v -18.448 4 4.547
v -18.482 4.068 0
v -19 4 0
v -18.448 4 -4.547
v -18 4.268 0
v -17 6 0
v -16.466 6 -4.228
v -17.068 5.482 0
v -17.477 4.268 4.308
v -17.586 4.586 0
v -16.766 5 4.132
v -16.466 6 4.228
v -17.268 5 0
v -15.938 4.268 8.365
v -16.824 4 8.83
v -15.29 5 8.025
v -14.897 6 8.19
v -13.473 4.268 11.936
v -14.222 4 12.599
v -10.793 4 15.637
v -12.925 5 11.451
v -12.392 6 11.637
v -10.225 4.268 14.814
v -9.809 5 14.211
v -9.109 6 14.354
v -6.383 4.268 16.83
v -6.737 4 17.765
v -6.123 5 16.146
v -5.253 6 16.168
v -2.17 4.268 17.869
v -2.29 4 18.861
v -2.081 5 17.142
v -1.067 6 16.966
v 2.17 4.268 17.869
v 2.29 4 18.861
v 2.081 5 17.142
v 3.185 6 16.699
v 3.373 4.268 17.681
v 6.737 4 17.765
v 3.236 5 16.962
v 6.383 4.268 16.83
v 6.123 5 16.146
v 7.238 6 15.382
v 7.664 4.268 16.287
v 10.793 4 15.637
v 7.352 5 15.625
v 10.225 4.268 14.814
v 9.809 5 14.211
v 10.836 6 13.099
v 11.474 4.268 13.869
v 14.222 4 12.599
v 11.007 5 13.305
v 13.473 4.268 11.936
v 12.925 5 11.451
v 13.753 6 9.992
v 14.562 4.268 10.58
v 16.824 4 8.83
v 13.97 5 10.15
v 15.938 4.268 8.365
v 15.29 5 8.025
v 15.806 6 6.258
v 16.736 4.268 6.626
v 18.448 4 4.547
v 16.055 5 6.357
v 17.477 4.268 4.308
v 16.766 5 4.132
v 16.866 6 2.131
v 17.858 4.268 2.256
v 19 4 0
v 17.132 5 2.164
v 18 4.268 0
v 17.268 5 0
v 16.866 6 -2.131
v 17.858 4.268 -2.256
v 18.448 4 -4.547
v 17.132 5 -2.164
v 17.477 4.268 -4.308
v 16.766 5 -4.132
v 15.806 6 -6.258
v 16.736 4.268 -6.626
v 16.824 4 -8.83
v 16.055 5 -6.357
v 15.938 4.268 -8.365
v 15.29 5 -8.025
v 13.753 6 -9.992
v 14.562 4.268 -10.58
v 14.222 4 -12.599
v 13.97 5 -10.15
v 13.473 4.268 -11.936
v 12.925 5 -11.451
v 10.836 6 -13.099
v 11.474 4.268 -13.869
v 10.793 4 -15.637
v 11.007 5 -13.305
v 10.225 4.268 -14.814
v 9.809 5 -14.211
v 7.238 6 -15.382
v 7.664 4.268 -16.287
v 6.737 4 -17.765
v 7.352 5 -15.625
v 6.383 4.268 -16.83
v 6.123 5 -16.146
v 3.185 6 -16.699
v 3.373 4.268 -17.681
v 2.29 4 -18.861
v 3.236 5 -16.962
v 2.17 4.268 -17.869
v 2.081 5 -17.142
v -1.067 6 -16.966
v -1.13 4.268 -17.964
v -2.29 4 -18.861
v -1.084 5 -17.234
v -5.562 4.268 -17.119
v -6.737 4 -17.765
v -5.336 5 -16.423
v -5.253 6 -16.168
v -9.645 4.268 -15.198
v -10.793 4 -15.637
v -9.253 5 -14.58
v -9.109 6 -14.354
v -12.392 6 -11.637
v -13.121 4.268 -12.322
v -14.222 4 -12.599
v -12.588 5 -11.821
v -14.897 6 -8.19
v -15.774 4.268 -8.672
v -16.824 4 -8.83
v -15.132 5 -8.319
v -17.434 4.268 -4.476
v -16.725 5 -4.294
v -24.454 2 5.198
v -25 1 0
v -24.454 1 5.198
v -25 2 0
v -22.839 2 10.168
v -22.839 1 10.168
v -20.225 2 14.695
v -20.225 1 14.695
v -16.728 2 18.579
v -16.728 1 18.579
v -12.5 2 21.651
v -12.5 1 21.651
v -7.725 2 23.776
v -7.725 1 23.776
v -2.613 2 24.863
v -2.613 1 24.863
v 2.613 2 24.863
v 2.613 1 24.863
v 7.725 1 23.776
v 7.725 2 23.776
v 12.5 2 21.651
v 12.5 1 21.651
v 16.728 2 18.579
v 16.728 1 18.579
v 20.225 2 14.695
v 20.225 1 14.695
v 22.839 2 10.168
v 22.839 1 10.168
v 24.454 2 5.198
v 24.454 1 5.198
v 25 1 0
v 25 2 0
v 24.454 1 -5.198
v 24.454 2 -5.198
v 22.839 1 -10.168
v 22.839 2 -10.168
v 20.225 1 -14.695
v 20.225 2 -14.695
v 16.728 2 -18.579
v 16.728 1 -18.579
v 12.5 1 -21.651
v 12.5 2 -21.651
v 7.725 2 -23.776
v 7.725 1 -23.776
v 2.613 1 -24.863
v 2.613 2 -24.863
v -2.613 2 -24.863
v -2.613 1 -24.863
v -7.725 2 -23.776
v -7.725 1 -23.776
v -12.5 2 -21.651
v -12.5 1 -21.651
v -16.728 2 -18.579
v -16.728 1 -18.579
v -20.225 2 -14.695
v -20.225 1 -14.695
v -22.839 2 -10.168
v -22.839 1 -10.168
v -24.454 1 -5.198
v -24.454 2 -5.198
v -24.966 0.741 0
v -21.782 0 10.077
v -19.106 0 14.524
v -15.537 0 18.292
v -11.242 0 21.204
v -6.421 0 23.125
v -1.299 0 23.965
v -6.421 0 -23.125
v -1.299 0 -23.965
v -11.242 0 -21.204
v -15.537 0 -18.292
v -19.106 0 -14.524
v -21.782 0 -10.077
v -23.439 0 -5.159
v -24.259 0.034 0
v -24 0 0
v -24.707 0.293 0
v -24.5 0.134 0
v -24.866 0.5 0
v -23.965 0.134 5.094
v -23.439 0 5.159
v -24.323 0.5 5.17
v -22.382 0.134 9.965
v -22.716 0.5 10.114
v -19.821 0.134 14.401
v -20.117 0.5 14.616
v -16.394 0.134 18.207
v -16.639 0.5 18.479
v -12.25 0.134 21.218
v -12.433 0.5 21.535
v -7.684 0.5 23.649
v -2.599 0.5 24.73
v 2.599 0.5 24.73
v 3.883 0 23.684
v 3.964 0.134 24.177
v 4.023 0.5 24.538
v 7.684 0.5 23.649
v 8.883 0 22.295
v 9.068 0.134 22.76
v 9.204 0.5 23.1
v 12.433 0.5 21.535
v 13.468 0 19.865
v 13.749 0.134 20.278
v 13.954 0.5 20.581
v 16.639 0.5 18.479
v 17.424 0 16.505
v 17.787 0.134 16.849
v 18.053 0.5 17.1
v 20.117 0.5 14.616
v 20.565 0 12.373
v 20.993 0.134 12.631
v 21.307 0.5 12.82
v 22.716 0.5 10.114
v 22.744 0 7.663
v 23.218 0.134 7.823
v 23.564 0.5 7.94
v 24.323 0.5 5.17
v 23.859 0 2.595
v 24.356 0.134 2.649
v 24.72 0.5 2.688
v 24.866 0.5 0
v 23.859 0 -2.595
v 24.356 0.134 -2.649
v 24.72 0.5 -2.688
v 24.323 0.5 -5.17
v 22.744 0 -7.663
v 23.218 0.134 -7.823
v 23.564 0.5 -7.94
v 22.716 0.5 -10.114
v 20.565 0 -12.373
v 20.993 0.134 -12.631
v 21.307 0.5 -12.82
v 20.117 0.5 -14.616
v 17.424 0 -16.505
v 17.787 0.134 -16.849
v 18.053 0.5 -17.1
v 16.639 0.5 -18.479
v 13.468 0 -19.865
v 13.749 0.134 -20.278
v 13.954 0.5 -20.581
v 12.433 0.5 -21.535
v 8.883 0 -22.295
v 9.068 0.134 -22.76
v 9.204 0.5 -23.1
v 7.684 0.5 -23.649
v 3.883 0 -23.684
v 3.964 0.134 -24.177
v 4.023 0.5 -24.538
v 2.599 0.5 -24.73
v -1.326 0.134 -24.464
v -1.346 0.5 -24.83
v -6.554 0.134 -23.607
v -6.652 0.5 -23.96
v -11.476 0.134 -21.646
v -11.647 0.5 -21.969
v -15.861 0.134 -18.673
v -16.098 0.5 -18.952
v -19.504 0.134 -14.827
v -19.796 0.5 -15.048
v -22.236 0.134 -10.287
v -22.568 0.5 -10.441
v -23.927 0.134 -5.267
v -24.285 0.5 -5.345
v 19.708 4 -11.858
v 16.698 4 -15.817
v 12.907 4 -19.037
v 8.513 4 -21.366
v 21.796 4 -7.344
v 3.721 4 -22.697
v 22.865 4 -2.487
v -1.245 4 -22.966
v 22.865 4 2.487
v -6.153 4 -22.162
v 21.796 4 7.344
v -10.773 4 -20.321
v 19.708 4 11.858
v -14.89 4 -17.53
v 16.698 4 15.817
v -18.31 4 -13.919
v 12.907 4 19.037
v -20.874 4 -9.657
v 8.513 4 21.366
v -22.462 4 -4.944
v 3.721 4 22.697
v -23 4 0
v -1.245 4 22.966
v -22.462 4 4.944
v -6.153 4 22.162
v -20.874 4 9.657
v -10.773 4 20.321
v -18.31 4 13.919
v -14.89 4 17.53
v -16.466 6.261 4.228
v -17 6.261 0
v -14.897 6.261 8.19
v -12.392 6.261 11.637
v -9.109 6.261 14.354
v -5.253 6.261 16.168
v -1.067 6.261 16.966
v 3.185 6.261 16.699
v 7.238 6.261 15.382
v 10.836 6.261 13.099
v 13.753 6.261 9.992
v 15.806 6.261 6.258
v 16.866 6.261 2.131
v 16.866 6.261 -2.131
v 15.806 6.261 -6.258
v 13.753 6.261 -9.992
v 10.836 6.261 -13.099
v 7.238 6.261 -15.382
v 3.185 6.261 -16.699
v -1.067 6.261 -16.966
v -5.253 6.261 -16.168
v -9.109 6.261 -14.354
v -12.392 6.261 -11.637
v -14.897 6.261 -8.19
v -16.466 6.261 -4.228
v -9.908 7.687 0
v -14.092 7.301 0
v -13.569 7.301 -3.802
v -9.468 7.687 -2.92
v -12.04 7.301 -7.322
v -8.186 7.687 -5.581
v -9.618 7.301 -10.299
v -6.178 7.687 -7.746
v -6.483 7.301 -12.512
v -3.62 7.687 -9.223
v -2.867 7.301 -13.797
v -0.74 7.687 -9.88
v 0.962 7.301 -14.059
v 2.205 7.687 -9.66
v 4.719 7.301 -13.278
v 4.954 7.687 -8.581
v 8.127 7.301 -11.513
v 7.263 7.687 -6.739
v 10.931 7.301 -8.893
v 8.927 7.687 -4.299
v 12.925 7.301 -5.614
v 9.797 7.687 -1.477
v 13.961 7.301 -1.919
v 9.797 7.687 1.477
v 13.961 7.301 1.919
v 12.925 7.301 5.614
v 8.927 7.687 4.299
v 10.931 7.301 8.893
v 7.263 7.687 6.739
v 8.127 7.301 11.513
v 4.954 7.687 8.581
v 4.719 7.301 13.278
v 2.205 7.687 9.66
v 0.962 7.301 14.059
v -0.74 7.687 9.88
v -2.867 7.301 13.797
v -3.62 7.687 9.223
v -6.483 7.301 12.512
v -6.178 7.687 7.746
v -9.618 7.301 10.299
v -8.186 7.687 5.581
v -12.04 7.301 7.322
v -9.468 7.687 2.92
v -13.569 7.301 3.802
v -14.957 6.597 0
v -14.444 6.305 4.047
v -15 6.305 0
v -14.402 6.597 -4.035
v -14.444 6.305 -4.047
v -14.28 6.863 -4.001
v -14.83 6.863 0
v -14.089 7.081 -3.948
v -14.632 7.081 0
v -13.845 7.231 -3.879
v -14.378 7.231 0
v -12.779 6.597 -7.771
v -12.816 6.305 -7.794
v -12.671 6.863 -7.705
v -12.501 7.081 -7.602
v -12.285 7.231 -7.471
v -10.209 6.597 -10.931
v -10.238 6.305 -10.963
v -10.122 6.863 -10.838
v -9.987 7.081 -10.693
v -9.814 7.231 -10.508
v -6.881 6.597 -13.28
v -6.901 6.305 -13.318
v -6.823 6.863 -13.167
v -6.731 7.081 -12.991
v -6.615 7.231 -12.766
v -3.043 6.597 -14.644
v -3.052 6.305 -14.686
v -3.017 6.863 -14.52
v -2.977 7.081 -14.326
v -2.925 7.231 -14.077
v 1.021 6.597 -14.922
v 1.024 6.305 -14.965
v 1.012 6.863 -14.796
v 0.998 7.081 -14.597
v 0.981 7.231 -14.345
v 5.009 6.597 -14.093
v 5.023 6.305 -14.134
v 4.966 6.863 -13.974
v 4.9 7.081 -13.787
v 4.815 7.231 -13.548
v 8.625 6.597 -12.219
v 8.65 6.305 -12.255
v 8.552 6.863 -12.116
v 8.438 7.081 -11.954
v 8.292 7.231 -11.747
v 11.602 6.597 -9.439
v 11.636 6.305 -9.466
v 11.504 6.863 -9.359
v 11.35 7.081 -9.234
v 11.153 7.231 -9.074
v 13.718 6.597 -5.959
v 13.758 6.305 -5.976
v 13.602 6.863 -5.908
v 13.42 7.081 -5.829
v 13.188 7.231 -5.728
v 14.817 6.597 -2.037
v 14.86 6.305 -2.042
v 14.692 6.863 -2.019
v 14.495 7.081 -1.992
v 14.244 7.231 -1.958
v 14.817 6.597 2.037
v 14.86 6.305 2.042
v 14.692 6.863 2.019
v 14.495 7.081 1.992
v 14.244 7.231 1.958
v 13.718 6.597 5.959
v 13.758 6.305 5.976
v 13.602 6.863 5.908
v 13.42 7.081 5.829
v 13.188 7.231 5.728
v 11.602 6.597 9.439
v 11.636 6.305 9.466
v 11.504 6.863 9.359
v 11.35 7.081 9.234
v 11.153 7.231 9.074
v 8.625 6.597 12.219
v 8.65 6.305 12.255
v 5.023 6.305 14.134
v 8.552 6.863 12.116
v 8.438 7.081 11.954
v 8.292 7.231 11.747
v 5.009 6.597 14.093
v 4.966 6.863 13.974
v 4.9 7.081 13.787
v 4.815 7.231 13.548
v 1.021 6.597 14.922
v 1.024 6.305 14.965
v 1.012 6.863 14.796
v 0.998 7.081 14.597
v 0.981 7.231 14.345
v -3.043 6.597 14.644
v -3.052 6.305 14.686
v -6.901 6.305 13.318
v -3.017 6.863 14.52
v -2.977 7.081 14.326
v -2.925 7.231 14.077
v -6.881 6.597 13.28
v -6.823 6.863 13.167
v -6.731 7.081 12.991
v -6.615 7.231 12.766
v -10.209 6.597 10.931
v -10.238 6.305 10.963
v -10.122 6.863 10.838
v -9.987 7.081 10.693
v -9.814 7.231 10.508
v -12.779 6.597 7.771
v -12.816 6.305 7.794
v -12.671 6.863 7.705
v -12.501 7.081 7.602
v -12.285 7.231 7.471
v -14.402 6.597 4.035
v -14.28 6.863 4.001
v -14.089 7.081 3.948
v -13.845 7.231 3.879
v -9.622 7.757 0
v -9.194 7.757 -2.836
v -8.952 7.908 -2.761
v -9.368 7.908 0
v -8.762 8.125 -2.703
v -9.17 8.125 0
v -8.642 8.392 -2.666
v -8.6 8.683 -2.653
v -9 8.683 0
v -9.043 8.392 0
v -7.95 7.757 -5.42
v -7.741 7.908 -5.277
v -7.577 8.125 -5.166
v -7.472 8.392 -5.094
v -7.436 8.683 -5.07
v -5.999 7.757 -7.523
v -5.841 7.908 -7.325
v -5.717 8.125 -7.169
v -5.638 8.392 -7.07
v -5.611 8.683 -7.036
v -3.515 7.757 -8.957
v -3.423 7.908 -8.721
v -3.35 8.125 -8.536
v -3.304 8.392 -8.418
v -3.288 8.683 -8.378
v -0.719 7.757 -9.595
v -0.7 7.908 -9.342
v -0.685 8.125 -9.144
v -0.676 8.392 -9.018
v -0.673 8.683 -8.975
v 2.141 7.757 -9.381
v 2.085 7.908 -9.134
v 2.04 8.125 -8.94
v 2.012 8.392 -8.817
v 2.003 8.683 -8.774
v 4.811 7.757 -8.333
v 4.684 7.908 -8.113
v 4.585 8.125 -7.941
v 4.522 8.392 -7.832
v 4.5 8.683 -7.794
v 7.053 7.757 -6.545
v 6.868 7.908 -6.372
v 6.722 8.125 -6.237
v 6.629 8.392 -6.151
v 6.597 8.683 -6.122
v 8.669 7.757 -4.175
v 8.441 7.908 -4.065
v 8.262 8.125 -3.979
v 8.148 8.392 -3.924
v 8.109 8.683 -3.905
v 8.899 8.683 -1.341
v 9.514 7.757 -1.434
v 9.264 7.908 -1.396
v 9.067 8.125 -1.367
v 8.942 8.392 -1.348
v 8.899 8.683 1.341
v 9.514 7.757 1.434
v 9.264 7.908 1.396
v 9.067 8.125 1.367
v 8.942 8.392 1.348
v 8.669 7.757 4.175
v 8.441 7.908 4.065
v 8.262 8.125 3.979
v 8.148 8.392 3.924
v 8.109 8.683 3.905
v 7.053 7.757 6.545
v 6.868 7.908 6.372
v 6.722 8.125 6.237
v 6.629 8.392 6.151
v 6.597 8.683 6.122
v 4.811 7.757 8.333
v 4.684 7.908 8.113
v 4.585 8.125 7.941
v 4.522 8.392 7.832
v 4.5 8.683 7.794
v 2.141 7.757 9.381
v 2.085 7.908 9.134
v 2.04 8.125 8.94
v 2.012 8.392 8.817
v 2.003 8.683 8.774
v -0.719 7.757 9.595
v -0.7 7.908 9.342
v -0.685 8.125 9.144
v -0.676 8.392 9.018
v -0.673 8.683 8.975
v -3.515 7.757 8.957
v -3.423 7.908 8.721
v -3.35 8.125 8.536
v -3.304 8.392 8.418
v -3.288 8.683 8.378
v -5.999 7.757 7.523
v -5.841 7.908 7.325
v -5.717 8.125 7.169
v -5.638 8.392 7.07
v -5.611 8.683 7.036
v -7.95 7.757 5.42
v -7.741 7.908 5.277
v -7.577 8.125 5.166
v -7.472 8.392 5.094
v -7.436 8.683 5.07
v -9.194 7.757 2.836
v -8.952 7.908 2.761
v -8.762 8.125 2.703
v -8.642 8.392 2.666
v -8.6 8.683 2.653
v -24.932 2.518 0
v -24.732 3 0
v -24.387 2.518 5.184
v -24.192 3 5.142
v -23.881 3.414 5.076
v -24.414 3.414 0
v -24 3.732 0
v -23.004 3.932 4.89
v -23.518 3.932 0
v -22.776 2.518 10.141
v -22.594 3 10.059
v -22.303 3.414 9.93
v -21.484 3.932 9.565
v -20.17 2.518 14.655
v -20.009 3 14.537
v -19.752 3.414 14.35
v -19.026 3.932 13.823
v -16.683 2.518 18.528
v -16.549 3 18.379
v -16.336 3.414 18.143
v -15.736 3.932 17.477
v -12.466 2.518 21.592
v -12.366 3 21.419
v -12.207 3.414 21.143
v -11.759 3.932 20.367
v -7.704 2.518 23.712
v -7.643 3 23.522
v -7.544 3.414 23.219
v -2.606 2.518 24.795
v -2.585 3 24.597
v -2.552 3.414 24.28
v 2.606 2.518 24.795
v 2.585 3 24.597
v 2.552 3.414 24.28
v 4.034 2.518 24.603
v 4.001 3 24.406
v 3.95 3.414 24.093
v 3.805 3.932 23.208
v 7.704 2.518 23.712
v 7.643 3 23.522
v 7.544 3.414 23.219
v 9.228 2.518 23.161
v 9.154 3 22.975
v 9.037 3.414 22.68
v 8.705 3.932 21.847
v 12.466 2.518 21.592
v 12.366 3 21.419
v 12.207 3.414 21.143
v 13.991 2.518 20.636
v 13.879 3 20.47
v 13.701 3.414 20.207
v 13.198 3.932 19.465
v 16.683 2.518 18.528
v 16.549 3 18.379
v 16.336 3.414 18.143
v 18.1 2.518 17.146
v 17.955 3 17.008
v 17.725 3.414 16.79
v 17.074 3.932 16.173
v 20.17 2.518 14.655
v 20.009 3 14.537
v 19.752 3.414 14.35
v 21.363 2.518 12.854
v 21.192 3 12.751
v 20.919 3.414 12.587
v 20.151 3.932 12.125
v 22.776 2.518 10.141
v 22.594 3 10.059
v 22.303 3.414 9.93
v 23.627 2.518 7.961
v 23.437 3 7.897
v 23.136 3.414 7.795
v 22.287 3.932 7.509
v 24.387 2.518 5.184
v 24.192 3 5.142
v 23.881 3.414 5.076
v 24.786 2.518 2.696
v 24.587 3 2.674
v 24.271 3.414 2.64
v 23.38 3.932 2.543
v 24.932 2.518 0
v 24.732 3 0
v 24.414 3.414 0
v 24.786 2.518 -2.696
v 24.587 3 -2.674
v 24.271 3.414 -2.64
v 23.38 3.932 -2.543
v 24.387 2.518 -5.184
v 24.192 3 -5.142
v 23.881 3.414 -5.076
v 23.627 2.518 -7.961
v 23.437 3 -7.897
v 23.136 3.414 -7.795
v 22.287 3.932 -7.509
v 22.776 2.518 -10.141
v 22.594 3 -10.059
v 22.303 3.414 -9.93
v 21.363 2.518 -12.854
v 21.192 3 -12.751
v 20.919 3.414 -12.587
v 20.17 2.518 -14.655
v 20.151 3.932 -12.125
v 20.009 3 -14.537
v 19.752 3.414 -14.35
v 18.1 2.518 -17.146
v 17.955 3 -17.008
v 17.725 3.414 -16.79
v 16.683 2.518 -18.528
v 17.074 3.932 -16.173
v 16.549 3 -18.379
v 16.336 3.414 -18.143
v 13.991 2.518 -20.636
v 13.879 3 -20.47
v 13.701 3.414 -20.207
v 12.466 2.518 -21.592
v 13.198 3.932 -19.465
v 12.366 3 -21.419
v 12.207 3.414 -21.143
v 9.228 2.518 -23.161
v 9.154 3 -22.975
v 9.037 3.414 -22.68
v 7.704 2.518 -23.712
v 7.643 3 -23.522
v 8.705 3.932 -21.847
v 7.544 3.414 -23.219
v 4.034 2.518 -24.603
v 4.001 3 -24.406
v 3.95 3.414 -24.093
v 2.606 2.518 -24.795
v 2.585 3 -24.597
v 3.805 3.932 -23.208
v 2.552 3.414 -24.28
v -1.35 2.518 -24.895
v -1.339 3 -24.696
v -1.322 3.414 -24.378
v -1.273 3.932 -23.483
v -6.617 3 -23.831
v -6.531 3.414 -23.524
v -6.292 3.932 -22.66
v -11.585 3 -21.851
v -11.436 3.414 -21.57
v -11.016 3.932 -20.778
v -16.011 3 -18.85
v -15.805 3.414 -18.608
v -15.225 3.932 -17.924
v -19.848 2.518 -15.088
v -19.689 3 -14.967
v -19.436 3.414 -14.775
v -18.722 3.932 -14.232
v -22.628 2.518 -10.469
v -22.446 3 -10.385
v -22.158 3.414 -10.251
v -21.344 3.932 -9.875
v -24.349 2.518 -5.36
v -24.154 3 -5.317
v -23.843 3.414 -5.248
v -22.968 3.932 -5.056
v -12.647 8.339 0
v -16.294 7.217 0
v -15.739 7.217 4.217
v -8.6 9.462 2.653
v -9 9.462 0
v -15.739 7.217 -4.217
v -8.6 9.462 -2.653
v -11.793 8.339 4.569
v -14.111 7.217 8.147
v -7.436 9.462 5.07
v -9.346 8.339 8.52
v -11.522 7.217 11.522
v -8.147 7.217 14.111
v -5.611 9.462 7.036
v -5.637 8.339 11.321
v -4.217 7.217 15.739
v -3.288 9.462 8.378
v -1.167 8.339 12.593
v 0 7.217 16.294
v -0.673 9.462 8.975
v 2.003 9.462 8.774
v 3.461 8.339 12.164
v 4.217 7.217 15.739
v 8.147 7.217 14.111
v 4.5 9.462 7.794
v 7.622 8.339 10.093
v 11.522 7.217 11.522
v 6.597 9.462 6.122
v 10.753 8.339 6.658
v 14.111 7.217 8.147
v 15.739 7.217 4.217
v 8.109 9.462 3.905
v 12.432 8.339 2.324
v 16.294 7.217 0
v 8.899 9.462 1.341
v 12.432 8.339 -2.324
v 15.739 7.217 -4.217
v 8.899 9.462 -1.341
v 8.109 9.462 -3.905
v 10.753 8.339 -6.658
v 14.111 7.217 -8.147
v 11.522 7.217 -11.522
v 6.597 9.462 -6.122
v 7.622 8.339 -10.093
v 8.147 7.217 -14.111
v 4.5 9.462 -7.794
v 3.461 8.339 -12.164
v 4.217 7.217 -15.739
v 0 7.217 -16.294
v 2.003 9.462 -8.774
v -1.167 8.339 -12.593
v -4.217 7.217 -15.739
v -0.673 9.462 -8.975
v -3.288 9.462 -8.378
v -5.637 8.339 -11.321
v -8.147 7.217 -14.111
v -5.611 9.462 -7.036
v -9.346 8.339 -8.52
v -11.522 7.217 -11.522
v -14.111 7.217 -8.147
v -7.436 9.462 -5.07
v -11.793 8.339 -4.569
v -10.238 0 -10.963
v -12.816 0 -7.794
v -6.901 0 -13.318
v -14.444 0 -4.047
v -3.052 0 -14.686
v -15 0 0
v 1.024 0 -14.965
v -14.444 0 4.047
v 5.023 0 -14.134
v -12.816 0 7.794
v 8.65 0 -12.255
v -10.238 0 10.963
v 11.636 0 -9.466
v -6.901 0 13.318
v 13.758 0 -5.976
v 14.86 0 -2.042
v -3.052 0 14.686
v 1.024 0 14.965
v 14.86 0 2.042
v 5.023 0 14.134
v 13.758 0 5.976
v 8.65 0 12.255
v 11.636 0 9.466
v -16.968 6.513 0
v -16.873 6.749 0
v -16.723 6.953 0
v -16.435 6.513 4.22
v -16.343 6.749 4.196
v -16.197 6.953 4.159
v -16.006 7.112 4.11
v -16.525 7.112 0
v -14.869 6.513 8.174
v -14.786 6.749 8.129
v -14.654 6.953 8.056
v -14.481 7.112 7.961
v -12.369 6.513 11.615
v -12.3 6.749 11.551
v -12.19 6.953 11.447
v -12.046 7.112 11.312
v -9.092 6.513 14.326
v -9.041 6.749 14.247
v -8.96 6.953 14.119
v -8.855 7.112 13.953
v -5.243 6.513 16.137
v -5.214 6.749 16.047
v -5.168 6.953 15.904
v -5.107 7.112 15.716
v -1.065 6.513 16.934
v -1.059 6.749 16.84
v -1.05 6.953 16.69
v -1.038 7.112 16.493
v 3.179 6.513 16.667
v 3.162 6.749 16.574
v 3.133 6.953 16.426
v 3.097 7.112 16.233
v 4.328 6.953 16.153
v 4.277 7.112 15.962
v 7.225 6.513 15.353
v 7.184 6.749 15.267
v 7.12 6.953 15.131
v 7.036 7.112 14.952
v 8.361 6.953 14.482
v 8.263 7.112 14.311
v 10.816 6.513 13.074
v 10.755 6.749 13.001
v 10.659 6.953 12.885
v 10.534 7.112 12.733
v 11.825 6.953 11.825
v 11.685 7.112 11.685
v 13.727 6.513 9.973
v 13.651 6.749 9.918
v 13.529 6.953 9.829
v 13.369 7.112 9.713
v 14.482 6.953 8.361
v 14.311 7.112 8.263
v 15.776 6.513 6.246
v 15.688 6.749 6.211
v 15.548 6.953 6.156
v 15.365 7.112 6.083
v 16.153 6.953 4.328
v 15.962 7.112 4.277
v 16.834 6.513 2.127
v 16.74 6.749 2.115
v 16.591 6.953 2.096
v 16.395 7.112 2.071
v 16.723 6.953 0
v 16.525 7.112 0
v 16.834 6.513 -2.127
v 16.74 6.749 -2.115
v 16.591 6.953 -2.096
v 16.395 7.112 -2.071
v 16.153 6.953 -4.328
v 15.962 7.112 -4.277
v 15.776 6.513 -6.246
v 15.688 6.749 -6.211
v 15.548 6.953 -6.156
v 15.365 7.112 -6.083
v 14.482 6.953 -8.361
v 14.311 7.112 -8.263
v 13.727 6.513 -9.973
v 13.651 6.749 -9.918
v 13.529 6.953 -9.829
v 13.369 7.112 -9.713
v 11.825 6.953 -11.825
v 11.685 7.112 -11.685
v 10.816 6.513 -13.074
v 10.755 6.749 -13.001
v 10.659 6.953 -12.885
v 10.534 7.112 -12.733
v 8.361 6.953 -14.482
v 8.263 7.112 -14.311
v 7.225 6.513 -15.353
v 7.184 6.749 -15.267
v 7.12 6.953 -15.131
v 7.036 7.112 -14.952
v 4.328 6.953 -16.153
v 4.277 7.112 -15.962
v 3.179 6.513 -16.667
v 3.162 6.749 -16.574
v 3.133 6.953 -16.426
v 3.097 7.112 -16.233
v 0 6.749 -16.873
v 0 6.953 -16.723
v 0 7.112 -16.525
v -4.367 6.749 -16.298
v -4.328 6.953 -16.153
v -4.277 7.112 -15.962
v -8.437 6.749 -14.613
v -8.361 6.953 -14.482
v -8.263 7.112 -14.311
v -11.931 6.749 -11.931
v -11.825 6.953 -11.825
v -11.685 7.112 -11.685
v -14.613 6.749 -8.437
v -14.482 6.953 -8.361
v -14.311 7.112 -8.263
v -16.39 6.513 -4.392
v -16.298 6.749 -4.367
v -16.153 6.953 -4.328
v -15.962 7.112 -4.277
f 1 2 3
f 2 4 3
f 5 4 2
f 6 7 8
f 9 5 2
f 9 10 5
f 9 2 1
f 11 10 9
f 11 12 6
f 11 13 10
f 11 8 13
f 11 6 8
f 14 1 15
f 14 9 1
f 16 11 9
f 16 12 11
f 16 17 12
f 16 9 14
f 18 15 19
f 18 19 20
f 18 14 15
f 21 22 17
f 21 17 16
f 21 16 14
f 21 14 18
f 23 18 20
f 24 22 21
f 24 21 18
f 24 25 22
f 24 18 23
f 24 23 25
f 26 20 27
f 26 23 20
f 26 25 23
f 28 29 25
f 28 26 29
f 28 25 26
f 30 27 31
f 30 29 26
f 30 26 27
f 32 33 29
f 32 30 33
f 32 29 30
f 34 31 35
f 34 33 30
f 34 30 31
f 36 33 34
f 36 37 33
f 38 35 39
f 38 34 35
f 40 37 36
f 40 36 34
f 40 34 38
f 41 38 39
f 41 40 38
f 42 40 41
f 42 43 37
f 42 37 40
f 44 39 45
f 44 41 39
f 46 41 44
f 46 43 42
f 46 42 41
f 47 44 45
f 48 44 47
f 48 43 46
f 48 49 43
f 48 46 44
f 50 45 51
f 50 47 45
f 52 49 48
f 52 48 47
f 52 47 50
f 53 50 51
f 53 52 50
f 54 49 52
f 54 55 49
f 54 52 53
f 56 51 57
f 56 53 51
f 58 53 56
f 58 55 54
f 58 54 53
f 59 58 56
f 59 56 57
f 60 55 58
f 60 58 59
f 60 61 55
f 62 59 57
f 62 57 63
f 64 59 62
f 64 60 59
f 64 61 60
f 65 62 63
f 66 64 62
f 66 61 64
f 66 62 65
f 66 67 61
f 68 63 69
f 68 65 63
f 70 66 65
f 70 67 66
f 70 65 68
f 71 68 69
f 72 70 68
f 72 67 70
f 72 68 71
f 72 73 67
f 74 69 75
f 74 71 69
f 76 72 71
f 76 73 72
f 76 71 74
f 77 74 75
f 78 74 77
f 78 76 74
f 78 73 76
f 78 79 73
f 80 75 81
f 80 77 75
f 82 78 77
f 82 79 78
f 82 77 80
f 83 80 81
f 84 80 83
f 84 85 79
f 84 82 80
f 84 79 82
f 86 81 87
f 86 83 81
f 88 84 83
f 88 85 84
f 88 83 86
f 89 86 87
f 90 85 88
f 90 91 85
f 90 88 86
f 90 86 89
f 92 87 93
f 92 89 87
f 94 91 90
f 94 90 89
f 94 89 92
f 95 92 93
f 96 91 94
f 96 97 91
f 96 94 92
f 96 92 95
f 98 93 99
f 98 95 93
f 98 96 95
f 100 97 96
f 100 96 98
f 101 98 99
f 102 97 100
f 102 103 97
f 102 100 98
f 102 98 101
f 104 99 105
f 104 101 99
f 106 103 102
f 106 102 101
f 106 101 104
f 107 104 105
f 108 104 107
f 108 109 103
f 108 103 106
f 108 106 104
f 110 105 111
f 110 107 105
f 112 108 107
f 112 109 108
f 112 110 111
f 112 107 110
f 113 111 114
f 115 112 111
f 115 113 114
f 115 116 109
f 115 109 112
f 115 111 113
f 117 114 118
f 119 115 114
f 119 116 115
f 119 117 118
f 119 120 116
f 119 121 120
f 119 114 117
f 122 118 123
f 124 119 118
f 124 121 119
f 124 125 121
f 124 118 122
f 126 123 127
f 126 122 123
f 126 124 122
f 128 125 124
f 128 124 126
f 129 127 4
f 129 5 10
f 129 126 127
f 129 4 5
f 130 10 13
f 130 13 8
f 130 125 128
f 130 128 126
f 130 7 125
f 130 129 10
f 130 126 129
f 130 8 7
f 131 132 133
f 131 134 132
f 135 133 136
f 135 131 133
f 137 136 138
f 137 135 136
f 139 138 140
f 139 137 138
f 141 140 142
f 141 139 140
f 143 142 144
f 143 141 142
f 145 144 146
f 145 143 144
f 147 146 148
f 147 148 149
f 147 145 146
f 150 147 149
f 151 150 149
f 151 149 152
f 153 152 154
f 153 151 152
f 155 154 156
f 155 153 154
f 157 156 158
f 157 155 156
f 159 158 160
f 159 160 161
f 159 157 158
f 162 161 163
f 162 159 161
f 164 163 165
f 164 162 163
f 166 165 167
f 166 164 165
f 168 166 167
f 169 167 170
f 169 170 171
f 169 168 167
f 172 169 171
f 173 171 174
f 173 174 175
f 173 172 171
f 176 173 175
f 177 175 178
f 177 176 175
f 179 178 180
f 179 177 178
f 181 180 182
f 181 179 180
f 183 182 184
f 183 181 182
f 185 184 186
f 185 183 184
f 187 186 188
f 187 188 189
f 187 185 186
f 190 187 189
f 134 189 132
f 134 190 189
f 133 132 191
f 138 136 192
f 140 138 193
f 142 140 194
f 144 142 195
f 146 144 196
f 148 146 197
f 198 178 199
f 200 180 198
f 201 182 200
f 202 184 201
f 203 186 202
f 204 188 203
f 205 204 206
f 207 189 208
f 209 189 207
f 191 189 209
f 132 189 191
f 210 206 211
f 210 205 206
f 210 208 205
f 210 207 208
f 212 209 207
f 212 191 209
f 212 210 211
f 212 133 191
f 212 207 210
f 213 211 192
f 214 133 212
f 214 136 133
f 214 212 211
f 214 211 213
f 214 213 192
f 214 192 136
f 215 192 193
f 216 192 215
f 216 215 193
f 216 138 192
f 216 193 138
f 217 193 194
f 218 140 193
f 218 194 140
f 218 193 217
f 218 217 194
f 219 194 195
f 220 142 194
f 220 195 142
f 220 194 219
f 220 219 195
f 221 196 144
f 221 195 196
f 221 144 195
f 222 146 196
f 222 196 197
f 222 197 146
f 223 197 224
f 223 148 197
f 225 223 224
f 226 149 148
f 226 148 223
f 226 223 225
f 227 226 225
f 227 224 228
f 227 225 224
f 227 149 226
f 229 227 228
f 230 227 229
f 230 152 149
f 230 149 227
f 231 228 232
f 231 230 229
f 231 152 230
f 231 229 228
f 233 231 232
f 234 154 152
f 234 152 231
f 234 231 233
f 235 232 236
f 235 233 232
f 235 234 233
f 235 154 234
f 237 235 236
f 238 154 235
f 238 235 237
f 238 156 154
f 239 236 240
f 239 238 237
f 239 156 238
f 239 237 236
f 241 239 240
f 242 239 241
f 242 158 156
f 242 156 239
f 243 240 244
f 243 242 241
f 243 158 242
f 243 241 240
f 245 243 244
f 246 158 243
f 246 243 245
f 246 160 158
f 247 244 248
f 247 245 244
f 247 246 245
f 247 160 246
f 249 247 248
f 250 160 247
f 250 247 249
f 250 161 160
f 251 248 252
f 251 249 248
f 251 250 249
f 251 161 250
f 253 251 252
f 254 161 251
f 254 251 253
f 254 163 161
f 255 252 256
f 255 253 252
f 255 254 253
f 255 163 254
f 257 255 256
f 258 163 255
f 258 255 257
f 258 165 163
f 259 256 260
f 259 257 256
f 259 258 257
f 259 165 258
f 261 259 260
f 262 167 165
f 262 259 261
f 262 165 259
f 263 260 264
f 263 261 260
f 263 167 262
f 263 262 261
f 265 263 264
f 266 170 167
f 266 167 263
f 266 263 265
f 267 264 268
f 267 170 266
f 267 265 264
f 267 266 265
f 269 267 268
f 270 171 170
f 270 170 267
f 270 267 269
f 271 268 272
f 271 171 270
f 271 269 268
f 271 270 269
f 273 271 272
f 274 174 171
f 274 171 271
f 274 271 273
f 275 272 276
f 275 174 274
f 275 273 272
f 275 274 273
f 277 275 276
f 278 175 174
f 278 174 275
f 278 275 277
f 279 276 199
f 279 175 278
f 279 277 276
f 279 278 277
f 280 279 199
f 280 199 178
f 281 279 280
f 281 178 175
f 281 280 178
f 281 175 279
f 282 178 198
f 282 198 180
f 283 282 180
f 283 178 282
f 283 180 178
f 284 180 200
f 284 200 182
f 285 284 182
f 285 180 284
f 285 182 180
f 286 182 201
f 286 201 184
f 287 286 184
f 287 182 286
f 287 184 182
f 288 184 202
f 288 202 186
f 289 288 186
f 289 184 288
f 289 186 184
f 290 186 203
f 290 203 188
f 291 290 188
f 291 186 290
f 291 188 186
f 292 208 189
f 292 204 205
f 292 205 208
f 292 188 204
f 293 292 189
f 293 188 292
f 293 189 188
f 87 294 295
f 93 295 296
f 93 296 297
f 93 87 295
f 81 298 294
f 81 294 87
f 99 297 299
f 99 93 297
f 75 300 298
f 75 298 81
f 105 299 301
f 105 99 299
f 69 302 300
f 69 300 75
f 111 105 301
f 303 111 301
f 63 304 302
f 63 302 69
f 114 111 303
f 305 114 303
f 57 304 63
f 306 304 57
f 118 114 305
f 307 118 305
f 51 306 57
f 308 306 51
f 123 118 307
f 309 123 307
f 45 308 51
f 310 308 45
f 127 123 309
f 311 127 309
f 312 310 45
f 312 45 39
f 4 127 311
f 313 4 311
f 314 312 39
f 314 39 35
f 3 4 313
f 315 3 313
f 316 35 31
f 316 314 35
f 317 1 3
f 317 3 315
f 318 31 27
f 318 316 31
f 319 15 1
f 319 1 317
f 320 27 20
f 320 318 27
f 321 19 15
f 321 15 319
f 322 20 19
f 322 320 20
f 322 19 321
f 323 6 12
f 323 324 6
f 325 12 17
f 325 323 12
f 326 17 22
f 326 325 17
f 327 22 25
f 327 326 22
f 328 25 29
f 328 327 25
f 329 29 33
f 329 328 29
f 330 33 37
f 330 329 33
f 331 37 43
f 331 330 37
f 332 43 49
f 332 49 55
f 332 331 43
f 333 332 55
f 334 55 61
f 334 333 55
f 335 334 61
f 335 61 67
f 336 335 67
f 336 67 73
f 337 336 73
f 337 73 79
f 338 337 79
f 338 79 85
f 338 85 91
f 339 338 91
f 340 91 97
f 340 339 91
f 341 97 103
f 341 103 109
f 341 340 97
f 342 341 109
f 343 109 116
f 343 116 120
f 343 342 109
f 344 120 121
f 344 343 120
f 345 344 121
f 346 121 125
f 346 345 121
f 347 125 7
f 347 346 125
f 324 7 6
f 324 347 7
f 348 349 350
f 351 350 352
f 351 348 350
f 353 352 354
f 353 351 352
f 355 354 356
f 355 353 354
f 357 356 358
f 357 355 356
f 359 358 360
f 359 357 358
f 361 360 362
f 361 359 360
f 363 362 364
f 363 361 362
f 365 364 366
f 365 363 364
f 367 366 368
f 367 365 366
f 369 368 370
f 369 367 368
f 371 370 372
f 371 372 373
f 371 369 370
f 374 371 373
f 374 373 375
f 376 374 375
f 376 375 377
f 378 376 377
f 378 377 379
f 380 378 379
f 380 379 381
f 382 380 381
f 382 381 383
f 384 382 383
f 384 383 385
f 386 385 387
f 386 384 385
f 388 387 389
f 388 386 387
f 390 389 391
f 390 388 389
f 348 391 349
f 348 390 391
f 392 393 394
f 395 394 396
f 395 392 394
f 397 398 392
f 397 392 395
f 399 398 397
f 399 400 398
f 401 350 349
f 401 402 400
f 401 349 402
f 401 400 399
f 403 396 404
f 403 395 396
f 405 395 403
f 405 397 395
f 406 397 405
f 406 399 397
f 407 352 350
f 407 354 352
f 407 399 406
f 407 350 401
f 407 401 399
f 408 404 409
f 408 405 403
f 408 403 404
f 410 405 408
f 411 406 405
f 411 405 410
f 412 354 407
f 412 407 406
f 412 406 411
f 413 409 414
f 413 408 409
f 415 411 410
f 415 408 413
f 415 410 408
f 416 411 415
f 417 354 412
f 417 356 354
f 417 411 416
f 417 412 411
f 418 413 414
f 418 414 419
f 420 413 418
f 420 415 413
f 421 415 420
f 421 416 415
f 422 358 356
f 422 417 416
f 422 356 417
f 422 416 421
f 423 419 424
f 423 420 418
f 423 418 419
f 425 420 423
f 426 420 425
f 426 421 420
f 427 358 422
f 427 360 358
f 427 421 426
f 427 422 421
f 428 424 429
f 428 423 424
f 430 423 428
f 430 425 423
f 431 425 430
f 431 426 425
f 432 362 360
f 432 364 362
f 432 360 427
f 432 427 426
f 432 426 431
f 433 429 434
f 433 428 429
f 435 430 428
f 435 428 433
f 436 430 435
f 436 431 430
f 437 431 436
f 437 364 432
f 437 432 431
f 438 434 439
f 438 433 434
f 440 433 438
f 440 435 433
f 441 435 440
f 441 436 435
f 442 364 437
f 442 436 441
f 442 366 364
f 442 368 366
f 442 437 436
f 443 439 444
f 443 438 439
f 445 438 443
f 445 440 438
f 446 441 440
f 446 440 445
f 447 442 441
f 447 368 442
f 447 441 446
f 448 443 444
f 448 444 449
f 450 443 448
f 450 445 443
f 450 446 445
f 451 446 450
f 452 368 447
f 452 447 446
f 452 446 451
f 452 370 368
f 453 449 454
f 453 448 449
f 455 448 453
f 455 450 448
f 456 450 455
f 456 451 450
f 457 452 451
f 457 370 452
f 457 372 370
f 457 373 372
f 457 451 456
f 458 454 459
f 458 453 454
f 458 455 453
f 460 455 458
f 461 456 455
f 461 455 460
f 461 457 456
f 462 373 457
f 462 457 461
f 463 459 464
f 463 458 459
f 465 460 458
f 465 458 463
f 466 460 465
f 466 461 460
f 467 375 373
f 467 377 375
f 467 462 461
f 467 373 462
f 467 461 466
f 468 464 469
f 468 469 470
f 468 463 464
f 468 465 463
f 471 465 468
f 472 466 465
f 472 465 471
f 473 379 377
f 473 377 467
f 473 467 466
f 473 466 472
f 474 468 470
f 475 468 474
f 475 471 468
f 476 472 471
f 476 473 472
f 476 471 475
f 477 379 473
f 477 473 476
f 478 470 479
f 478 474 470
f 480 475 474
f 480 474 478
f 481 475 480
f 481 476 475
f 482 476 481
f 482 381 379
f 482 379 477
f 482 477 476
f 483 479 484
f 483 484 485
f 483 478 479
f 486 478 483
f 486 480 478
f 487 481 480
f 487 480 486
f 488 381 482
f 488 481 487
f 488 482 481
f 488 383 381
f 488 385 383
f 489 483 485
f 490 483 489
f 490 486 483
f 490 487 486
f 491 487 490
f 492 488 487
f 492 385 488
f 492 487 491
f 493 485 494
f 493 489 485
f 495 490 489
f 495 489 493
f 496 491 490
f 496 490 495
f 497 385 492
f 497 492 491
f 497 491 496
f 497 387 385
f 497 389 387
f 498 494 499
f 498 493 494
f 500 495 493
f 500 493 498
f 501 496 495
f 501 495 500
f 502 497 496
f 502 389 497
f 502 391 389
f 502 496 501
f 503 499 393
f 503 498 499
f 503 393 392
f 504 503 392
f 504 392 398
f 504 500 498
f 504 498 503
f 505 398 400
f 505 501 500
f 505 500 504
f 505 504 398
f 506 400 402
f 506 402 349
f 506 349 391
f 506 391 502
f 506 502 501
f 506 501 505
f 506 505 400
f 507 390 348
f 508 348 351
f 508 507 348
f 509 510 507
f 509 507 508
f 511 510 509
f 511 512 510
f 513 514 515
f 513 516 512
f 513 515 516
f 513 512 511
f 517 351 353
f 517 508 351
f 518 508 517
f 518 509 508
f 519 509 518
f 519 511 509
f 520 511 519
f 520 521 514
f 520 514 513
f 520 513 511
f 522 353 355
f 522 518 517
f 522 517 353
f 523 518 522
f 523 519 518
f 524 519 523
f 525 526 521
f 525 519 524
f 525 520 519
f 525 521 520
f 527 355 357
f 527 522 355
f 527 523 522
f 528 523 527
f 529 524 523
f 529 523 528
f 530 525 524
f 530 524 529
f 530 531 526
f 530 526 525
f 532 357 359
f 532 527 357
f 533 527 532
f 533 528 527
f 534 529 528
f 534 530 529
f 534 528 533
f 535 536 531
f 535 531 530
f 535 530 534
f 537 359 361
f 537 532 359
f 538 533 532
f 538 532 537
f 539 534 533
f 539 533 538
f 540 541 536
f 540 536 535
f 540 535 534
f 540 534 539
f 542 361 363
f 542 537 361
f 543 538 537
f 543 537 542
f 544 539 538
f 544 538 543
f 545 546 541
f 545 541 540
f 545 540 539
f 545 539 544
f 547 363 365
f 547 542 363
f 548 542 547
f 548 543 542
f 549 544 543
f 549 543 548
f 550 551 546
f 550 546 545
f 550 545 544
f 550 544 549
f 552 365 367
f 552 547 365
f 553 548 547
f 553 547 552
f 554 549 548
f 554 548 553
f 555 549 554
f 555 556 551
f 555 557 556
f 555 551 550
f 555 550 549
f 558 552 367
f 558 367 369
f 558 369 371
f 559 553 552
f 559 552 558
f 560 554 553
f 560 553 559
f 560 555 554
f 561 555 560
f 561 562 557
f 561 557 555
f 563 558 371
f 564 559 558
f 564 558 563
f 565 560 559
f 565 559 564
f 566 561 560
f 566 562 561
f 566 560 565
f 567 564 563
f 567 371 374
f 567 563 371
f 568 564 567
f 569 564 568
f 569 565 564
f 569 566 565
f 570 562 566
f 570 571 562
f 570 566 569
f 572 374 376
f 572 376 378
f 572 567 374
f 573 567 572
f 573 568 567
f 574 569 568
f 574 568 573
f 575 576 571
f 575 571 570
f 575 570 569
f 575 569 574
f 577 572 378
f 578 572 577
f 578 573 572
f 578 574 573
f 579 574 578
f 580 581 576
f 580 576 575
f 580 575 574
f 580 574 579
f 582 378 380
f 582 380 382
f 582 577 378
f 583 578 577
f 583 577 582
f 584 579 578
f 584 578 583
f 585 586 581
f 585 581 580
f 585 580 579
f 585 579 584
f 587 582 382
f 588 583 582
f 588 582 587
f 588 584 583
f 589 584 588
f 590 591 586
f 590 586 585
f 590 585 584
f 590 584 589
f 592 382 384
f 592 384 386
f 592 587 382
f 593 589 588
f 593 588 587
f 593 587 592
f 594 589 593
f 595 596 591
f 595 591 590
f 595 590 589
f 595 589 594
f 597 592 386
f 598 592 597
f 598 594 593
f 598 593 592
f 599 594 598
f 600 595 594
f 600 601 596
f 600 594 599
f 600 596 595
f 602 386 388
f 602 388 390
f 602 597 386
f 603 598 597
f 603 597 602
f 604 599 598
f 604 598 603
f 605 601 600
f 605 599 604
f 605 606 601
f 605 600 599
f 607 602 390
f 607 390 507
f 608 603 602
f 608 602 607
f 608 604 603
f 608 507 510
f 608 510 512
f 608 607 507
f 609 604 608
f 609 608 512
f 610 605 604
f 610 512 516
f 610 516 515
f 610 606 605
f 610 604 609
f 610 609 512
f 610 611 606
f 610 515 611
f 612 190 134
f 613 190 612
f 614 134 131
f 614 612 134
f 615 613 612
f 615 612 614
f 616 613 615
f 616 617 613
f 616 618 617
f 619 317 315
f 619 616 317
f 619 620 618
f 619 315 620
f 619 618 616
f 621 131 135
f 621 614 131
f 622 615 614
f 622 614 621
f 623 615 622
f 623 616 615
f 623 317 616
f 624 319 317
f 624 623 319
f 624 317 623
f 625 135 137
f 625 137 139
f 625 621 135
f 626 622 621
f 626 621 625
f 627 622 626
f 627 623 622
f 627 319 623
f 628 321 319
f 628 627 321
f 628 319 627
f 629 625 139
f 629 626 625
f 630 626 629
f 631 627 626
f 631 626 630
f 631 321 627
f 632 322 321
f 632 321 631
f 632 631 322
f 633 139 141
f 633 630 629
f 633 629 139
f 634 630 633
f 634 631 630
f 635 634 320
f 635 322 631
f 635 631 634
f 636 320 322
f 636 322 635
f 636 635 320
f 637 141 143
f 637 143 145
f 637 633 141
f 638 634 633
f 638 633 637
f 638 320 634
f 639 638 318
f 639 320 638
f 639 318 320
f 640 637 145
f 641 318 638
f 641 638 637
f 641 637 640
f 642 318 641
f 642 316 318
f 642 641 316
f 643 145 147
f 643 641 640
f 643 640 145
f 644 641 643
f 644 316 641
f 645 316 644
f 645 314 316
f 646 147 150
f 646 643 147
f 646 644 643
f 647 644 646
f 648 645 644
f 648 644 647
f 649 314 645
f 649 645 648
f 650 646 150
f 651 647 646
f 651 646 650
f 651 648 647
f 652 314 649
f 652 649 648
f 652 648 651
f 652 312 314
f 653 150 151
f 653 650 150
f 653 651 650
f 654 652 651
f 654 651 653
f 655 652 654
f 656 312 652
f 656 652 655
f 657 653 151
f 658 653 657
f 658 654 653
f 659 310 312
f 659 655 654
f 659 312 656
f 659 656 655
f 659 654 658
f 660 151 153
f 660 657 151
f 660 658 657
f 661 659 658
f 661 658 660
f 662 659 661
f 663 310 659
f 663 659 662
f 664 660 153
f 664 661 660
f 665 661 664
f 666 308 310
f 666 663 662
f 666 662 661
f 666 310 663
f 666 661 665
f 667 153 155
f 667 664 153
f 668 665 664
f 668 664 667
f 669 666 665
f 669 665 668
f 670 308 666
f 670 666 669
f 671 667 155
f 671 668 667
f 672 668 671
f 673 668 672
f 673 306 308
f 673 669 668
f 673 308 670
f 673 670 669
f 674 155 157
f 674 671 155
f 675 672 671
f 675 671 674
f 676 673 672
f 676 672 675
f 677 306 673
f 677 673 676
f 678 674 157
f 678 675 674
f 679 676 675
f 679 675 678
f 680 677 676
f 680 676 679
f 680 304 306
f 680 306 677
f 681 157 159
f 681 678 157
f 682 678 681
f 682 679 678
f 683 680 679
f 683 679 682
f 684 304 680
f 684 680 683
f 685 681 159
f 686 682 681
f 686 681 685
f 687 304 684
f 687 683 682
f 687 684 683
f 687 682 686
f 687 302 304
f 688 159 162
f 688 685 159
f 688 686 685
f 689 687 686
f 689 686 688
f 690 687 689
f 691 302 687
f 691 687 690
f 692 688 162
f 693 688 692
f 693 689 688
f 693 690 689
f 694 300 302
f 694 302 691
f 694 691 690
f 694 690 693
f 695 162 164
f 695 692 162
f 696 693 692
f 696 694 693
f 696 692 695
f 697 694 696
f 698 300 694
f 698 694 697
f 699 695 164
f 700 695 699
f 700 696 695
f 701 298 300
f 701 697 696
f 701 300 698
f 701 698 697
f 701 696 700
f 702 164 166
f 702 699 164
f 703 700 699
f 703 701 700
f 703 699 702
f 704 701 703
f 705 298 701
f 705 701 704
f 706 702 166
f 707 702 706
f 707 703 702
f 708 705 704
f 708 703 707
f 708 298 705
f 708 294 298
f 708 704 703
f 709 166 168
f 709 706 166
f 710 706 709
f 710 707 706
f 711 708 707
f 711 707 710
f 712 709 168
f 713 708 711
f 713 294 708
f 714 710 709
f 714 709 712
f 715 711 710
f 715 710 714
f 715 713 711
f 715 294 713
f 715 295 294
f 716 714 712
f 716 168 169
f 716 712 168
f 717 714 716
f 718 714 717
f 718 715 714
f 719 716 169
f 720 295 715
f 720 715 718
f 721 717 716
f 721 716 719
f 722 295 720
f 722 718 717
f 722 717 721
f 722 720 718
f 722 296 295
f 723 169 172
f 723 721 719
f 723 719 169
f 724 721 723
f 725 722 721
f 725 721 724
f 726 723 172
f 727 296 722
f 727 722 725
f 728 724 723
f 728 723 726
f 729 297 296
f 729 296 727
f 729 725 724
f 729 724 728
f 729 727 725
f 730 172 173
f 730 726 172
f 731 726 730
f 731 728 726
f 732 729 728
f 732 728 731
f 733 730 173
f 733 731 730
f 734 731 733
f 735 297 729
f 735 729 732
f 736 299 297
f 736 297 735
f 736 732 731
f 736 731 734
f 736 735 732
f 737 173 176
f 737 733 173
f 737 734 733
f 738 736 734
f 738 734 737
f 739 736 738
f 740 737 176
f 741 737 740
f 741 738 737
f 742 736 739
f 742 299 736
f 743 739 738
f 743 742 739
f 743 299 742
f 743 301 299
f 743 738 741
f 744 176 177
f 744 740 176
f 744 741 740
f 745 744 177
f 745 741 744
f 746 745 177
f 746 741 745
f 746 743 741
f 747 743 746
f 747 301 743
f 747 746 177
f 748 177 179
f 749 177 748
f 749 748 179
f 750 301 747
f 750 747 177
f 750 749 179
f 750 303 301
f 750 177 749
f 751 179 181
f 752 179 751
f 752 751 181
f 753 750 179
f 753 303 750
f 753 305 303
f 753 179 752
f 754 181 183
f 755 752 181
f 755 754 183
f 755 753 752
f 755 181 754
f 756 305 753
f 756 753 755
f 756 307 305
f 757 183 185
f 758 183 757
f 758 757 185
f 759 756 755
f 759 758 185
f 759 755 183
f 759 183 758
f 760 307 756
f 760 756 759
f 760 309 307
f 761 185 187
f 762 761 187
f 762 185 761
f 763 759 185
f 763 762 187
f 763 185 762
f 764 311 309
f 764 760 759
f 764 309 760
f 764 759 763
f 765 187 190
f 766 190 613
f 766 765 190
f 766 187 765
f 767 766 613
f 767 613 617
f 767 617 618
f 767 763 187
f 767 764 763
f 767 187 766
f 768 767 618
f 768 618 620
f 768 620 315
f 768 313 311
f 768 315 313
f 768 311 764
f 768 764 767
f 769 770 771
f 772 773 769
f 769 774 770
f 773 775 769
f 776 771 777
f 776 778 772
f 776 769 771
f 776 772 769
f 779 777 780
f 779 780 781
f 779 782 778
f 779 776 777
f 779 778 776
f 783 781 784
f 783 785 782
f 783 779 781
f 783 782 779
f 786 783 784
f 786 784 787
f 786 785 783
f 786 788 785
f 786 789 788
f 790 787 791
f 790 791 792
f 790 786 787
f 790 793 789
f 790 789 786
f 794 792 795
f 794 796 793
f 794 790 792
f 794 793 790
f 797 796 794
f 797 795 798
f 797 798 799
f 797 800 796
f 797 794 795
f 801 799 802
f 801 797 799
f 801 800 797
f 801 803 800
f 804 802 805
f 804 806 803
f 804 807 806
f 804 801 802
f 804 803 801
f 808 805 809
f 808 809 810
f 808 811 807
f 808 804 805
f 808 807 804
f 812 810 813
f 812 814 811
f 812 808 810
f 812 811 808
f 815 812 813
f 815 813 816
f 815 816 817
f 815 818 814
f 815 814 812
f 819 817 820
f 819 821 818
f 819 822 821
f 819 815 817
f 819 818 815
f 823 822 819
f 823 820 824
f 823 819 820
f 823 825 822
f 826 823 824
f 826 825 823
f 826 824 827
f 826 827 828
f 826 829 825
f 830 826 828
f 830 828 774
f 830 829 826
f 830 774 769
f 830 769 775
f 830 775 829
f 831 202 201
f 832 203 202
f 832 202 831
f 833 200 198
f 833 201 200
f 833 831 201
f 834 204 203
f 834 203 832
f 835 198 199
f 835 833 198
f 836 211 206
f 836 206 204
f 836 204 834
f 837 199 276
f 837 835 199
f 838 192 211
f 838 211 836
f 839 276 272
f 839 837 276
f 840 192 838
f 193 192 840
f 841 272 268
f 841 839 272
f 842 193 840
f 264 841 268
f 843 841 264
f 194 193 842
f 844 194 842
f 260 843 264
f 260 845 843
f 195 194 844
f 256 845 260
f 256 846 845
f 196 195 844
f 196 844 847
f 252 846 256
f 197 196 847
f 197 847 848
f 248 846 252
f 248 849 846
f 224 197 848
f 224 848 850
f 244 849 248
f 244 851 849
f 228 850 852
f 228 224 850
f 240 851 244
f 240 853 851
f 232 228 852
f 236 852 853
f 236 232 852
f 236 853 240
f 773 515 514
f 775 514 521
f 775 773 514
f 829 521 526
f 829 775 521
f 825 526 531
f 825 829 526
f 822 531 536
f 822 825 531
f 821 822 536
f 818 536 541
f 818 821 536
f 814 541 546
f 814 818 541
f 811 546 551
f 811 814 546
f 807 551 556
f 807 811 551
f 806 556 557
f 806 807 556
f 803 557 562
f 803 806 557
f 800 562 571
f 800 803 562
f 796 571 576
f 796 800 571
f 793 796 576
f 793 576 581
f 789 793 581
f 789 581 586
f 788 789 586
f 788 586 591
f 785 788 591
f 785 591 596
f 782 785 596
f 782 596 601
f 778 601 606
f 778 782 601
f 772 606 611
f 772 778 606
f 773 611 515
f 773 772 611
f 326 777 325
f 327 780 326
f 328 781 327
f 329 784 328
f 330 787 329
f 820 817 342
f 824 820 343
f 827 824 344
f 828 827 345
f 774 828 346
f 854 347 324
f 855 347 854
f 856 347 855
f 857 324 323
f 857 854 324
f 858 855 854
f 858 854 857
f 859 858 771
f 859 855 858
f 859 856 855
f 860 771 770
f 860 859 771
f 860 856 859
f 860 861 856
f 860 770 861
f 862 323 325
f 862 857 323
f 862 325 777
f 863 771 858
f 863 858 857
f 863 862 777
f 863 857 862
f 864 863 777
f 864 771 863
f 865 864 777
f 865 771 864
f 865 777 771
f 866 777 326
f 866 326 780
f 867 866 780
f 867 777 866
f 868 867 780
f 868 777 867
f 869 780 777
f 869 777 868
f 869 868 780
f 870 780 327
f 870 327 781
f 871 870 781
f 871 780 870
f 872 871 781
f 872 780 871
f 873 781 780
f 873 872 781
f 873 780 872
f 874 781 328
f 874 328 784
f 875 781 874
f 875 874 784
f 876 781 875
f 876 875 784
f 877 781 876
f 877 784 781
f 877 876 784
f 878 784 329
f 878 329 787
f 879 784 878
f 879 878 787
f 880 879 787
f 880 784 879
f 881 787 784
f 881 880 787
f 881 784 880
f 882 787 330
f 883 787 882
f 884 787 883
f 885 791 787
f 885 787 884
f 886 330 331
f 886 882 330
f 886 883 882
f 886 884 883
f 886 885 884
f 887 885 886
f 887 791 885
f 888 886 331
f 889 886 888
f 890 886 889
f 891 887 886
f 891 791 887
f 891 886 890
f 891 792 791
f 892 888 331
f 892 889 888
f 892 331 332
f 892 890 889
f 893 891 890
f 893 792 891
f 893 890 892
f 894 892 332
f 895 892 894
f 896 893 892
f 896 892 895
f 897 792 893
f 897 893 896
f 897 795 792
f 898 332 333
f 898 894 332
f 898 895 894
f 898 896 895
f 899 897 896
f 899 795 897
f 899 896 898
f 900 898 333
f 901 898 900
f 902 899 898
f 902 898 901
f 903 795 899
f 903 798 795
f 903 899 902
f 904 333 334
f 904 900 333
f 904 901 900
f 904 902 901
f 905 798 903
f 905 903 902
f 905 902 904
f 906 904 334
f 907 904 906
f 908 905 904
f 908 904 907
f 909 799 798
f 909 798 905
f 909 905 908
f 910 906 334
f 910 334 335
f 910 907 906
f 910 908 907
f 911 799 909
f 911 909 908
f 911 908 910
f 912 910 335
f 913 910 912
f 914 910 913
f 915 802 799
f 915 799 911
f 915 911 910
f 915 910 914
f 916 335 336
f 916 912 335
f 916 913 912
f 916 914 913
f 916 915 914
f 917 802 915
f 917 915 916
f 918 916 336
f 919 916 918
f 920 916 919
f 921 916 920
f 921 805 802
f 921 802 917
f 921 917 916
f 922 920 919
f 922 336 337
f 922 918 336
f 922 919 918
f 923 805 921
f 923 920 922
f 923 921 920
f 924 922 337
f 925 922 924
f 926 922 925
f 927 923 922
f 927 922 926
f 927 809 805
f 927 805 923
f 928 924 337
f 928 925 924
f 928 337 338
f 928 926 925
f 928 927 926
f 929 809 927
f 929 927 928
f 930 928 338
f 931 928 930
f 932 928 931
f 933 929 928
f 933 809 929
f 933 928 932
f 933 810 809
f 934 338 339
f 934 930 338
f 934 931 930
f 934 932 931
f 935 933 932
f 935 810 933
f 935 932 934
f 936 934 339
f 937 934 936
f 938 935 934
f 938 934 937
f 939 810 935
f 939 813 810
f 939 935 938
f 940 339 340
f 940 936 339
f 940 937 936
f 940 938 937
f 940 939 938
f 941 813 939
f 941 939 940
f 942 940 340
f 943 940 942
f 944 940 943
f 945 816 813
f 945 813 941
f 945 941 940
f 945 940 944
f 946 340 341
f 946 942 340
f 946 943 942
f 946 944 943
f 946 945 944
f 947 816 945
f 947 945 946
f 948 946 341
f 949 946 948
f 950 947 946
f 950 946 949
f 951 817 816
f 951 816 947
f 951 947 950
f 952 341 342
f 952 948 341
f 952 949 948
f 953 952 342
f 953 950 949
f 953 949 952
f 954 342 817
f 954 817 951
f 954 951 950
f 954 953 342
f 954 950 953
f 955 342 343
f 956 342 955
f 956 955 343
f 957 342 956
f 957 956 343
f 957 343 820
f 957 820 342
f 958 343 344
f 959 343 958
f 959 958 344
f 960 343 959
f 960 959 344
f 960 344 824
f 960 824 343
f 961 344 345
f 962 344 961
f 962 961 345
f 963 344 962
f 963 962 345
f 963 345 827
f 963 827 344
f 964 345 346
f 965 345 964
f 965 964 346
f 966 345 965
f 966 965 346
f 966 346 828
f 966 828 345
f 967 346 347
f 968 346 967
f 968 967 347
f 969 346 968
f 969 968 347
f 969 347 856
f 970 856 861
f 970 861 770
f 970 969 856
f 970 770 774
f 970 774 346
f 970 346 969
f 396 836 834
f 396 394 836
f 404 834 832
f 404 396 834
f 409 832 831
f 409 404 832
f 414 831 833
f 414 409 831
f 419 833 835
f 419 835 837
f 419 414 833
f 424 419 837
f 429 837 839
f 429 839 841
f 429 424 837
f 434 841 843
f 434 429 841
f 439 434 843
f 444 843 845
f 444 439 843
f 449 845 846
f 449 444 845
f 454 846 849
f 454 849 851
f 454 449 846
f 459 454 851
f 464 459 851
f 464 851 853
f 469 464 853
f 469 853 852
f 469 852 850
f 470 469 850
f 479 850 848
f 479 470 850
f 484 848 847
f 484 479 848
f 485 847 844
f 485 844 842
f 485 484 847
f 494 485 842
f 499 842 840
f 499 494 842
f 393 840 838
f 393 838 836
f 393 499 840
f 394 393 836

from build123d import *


with BuildPart() as part:
    # Sketch1 → Revolve1 (revolve)
    with BuildSketch(Plane.XY):
        with BuildLine():
            Line((0, 0), (-24, 0))
            ThreePointArc((-24, 0), (-24.707106781, 0.292893219), (-25, 1))
            Line((-25, 1), (-25, 2))
            ThreePointArc((-25, 2), (-24.414213562, 3.414213562), (-23, 4))
            Line((-23, 4), (-19, 4))
            ThreePointArc((-19, 4), (-17.585786438, 4.585786438), (-17, 6))
            Line((-17, 6), (-17, 6.261425345))
            ThreePointArc((-17, 6.261425345), (-16.804389784, 6.855527252), (-16.294085849, 7.217204354))
            Line((-16.294085849, 7.217204354), (-4.143718222, 10.955779009))
            ThreePointArc((-4.143718222, 10.955779009), (-3.998328357, 10.988882958), (-3.849632373, 11))
            Line((-3.849632373, 11), (0, 11))
            Line((0, 11), (0, 0))
        make_face()
    revolve(axis=Axis((0, 0, 0), (0, 1, 0)))

    # Sketch3 → Cut-Revolve2 (revolve, cut)
    with BuildSketch(Plane.XY):
        with BuildLine():
            Line((0, 11), (0, 0))
            Line((0, 0), (-15, 0))
            Line((-15, 0), (-15, 6.305273568))
            ThreePointArc((-15, 6.305273568), (-14.738894744, 6.979094433), (-14.091930885, 7.301038958))
            Line((-14.091930885, 7.301038958), (-9.908069115, 7.687300741))
            ThreePointArc((-9.908069115, 7.687300741), (-9.261105256, 8.009245267), (-9, 8.683066131))
            Line((-9, 8.683066131), (-9, 11))
            Line((-9, 11), (0, 11))
        make_face()
    revolve(axis=Axis((0, 11, 0), (0, -1, 0)), mode=Mode.SUBTRACT)


solid = part.part
